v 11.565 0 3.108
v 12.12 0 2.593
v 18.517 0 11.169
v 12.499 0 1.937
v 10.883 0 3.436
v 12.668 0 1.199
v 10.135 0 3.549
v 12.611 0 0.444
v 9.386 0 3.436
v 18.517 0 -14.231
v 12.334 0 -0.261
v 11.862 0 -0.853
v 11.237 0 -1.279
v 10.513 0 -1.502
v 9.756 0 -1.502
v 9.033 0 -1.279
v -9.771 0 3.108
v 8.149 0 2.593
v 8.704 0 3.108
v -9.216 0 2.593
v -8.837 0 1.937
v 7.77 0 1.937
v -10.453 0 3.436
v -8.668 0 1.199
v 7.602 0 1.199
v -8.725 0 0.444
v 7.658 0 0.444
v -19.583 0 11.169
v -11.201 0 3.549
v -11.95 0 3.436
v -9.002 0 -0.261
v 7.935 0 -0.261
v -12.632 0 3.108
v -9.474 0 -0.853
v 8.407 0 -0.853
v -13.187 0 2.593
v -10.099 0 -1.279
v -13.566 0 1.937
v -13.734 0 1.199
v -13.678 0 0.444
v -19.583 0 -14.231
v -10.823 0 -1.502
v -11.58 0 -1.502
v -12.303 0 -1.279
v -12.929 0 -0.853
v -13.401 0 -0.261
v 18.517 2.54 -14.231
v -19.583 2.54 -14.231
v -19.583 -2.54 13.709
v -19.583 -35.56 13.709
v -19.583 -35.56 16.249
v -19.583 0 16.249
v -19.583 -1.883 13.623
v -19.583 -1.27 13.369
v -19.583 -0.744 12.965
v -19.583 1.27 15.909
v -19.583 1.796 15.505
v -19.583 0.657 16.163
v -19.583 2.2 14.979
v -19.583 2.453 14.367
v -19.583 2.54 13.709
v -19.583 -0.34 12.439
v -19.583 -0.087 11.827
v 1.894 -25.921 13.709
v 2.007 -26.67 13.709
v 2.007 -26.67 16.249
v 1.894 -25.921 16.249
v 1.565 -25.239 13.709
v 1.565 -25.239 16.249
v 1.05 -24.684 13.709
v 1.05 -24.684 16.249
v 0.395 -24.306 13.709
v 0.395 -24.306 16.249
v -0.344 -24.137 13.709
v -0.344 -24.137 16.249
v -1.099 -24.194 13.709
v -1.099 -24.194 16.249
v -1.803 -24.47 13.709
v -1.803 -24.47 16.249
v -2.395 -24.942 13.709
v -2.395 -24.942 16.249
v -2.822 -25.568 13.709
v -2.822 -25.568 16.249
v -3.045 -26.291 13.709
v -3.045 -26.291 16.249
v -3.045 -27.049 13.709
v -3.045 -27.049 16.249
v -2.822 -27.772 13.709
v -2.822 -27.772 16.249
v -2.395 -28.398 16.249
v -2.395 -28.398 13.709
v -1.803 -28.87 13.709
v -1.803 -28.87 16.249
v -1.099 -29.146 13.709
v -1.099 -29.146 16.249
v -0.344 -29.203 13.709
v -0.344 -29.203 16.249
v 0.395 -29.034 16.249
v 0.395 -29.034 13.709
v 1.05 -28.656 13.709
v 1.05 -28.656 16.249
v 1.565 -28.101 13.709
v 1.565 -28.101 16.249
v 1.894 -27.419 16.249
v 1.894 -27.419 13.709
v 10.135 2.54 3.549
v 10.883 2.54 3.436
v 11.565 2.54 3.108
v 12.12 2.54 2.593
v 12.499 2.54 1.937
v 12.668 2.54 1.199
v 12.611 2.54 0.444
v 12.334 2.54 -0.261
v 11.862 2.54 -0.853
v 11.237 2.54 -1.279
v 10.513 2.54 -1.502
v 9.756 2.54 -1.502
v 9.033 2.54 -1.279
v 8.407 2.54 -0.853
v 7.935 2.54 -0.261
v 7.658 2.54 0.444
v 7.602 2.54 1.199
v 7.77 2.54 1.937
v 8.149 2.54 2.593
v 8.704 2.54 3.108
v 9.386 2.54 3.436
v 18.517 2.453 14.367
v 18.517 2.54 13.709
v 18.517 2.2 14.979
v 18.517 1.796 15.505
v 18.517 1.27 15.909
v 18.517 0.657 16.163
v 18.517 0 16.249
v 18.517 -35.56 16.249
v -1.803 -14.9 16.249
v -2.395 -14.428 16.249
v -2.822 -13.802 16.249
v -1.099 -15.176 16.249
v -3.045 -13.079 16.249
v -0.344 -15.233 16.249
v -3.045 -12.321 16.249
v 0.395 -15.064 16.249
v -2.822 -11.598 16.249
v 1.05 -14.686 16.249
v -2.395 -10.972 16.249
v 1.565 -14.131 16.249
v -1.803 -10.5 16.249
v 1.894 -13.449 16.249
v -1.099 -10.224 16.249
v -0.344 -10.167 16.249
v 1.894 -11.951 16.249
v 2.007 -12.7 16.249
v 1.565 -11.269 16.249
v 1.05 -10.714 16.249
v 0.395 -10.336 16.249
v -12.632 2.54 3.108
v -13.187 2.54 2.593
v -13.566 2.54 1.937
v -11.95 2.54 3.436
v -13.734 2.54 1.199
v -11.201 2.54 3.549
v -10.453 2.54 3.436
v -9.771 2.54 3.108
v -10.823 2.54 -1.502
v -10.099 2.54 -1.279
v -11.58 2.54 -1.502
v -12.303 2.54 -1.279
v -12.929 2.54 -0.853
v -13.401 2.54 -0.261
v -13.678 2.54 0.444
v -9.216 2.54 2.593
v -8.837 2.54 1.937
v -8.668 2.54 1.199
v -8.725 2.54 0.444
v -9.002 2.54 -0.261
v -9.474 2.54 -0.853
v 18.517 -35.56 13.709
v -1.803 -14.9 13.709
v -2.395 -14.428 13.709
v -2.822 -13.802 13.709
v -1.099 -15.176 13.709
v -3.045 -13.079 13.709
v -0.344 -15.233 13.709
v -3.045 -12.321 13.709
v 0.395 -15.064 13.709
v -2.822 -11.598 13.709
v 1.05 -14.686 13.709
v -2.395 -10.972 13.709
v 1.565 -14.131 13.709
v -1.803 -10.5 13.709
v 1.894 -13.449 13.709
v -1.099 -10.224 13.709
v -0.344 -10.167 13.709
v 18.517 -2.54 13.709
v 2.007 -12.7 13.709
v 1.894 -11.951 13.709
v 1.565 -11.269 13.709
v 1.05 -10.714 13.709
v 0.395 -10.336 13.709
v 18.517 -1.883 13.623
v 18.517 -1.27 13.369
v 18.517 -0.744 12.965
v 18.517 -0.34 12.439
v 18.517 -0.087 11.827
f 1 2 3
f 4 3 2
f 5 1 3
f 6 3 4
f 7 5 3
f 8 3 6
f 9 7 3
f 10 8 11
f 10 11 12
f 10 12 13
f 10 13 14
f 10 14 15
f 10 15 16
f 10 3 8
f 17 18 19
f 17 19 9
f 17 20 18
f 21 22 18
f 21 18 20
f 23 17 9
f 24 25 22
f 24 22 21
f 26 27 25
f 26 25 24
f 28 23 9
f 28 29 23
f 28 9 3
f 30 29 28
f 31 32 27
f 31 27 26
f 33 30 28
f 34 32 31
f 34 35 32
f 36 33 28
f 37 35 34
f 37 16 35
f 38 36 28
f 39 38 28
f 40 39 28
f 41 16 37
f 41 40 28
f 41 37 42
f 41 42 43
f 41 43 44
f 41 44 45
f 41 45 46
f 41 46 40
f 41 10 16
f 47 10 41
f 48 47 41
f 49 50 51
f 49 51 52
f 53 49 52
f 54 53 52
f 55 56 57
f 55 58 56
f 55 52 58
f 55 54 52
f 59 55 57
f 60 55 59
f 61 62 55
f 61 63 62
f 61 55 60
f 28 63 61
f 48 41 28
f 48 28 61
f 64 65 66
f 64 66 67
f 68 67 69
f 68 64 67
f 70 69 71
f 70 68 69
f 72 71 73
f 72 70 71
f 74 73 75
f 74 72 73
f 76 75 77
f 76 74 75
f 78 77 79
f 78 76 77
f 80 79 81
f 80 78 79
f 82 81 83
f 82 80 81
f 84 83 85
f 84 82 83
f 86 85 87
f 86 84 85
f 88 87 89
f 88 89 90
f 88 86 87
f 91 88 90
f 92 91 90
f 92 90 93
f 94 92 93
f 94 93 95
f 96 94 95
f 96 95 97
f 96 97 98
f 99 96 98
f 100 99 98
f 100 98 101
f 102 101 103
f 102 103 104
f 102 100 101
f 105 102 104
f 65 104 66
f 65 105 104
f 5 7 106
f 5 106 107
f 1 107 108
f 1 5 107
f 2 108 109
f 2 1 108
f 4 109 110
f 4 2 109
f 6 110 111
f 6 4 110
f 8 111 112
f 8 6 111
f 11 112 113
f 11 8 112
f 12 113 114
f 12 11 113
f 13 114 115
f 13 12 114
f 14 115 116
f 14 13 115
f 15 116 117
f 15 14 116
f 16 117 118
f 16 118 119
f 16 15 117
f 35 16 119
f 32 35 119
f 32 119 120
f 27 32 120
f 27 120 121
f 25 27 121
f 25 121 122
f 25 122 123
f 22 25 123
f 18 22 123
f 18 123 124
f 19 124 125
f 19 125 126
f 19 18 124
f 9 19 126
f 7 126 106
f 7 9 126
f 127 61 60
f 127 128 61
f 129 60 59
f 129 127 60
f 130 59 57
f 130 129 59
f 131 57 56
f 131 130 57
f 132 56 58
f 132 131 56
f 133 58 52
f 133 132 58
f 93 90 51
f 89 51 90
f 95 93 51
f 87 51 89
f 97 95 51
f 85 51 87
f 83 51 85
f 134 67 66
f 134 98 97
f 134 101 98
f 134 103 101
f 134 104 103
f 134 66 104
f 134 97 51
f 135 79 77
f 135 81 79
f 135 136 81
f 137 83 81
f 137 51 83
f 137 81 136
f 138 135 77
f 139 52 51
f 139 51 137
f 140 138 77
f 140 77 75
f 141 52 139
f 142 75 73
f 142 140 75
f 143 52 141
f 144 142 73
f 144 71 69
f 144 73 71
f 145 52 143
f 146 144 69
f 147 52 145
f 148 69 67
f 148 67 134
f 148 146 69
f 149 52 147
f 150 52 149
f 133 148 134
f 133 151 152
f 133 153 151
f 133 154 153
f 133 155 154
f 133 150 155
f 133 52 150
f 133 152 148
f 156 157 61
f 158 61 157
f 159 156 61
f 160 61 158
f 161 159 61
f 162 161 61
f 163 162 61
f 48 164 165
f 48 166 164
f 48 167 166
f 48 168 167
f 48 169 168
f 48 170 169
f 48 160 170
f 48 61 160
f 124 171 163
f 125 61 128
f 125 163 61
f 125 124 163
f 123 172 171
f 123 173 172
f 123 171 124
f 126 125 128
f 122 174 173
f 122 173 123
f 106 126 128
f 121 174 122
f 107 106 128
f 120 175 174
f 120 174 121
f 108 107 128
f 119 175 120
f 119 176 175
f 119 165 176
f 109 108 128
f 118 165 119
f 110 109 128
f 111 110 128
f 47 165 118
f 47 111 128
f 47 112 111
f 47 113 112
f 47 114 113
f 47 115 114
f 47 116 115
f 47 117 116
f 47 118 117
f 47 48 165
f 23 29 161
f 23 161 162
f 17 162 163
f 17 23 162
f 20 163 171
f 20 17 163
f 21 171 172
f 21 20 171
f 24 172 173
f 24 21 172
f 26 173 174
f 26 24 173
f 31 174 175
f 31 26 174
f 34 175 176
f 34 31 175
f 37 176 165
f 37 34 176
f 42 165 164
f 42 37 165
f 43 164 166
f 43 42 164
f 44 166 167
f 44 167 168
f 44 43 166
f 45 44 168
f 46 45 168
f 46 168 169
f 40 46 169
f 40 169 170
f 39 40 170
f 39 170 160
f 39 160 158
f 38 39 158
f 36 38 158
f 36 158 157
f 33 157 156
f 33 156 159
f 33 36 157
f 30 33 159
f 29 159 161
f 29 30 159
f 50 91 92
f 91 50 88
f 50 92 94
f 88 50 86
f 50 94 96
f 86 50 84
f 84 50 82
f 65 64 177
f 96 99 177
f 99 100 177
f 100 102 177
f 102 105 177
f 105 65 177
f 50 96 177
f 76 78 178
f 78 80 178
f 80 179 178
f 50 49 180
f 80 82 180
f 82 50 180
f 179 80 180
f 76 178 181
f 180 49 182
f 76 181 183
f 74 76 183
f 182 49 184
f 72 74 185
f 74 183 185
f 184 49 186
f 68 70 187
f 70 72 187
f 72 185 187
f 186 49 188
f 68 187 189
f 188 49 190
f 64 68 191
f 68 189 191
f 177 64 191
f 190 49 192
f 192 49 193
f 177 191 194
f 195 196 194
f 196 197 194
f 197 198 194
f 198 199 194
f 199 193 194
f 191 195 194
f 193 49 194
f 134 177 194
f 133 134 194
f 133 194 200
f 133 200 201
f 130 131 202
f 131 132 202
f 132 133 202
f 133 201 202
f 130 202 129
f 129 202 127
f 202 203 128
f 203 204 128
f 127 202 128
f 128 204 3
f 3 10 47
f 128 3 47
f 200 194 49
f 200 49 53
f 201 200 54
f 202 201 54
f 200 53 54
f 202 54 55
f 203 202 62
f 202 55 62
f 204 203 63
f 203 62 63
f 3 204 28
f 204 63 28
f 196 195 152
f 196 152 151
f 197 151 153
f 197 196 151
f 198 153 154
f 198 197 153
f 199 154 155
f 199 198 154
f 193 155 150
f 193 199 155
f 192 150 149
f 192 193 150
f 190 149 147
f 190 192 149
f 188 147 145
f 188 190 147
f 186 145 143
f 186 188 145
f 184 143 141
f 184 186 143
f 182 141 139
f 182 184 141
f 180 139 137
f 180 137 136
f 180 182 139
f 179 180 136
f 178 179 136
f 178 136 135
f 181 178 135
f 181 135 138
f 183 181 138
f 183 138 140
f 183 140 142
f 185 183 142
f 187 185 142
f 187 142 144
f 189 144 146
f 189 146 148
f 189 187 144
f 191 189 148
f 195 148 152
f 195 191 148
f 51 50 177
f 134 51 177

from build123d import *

# Parameters (mm, degrees)
SKETCH1_R           = 2.54
BOSS_EXTRUDE1_DEPTH = 2.54
SKETCH2_W           = 38.1
SKETCH2_H           = 38.1
SKETCH2_R           = 2.54
BOSS_EXTRUDE2_DEPTH = 2.54
FILLET2_R           = 2.54
FILLET3_R           = 2.54


with BuildPart() as part:
    # Sketch1 → Boss-Extrude1 (new body)
    with BuildSketch(Plane(origin=(0, 0, 0), x_dir=(1, 0, 0), z_dir=(0, 1, 0))):
        Polygon((-19.583364039, 14.230768135), (-5.08, 14.230768135), (5.08, 14.230768135), (18.516635961, 14.230768135), (18.516635961, -13.709231865), (-19.583364039, -13.709231865), align=None)
        with Locations(Location((-11.201364039, -1.009231865, 0), (0, 0, 270))):
            Circle(SKETCH1_R, mode=Mode.SUBTRACT)
        with Locations(Location((10.134635961, -1.009231865, 0), (0, 0, 270))):
            Circle(SKETCH1_R, mode=Mode.SUBTRACT)
    extrude(amount=BOSS_EXTRUDE1_DEPTH)

    # Sketch2 → Boss-Extrude2 (add)
    with BuildSketch(Plane.XY.offset(13.709231865)):
        with Locations((-0.533364039, -16.51)):
            Rectangle(SKETCH2_W, SKETCH2_H)
        with Locations((-0.533364039, -12.7)):
            Circle(SKETCH2_R, mode=Mode.SUBTRACT)
        with Locations((-0.533364039, -26.67)):
            Circle(SKETCH2_R, mode=Mode.SUBTRACT)
    extrude(amount=BOSS_EXTRUDE2_DEPTH)

    # Fillet2
    fillet2_edges = [part.edges().sort_by_distance(p)[0] for p in [
        (-0.533364039, 0, 13.709231865),
    ]]
    fillet(fillet2_edges, radius=FILLET2_R)

    # Fillet3
    fillet3_edges = [part.edges().sort_by_distance(p)[0] for p in [
        (-0.533364039, 2.54, 16.249231865),
    ]]
    fillet(fillet3_edges, radius=FILLET3_R)


solid = part.part
